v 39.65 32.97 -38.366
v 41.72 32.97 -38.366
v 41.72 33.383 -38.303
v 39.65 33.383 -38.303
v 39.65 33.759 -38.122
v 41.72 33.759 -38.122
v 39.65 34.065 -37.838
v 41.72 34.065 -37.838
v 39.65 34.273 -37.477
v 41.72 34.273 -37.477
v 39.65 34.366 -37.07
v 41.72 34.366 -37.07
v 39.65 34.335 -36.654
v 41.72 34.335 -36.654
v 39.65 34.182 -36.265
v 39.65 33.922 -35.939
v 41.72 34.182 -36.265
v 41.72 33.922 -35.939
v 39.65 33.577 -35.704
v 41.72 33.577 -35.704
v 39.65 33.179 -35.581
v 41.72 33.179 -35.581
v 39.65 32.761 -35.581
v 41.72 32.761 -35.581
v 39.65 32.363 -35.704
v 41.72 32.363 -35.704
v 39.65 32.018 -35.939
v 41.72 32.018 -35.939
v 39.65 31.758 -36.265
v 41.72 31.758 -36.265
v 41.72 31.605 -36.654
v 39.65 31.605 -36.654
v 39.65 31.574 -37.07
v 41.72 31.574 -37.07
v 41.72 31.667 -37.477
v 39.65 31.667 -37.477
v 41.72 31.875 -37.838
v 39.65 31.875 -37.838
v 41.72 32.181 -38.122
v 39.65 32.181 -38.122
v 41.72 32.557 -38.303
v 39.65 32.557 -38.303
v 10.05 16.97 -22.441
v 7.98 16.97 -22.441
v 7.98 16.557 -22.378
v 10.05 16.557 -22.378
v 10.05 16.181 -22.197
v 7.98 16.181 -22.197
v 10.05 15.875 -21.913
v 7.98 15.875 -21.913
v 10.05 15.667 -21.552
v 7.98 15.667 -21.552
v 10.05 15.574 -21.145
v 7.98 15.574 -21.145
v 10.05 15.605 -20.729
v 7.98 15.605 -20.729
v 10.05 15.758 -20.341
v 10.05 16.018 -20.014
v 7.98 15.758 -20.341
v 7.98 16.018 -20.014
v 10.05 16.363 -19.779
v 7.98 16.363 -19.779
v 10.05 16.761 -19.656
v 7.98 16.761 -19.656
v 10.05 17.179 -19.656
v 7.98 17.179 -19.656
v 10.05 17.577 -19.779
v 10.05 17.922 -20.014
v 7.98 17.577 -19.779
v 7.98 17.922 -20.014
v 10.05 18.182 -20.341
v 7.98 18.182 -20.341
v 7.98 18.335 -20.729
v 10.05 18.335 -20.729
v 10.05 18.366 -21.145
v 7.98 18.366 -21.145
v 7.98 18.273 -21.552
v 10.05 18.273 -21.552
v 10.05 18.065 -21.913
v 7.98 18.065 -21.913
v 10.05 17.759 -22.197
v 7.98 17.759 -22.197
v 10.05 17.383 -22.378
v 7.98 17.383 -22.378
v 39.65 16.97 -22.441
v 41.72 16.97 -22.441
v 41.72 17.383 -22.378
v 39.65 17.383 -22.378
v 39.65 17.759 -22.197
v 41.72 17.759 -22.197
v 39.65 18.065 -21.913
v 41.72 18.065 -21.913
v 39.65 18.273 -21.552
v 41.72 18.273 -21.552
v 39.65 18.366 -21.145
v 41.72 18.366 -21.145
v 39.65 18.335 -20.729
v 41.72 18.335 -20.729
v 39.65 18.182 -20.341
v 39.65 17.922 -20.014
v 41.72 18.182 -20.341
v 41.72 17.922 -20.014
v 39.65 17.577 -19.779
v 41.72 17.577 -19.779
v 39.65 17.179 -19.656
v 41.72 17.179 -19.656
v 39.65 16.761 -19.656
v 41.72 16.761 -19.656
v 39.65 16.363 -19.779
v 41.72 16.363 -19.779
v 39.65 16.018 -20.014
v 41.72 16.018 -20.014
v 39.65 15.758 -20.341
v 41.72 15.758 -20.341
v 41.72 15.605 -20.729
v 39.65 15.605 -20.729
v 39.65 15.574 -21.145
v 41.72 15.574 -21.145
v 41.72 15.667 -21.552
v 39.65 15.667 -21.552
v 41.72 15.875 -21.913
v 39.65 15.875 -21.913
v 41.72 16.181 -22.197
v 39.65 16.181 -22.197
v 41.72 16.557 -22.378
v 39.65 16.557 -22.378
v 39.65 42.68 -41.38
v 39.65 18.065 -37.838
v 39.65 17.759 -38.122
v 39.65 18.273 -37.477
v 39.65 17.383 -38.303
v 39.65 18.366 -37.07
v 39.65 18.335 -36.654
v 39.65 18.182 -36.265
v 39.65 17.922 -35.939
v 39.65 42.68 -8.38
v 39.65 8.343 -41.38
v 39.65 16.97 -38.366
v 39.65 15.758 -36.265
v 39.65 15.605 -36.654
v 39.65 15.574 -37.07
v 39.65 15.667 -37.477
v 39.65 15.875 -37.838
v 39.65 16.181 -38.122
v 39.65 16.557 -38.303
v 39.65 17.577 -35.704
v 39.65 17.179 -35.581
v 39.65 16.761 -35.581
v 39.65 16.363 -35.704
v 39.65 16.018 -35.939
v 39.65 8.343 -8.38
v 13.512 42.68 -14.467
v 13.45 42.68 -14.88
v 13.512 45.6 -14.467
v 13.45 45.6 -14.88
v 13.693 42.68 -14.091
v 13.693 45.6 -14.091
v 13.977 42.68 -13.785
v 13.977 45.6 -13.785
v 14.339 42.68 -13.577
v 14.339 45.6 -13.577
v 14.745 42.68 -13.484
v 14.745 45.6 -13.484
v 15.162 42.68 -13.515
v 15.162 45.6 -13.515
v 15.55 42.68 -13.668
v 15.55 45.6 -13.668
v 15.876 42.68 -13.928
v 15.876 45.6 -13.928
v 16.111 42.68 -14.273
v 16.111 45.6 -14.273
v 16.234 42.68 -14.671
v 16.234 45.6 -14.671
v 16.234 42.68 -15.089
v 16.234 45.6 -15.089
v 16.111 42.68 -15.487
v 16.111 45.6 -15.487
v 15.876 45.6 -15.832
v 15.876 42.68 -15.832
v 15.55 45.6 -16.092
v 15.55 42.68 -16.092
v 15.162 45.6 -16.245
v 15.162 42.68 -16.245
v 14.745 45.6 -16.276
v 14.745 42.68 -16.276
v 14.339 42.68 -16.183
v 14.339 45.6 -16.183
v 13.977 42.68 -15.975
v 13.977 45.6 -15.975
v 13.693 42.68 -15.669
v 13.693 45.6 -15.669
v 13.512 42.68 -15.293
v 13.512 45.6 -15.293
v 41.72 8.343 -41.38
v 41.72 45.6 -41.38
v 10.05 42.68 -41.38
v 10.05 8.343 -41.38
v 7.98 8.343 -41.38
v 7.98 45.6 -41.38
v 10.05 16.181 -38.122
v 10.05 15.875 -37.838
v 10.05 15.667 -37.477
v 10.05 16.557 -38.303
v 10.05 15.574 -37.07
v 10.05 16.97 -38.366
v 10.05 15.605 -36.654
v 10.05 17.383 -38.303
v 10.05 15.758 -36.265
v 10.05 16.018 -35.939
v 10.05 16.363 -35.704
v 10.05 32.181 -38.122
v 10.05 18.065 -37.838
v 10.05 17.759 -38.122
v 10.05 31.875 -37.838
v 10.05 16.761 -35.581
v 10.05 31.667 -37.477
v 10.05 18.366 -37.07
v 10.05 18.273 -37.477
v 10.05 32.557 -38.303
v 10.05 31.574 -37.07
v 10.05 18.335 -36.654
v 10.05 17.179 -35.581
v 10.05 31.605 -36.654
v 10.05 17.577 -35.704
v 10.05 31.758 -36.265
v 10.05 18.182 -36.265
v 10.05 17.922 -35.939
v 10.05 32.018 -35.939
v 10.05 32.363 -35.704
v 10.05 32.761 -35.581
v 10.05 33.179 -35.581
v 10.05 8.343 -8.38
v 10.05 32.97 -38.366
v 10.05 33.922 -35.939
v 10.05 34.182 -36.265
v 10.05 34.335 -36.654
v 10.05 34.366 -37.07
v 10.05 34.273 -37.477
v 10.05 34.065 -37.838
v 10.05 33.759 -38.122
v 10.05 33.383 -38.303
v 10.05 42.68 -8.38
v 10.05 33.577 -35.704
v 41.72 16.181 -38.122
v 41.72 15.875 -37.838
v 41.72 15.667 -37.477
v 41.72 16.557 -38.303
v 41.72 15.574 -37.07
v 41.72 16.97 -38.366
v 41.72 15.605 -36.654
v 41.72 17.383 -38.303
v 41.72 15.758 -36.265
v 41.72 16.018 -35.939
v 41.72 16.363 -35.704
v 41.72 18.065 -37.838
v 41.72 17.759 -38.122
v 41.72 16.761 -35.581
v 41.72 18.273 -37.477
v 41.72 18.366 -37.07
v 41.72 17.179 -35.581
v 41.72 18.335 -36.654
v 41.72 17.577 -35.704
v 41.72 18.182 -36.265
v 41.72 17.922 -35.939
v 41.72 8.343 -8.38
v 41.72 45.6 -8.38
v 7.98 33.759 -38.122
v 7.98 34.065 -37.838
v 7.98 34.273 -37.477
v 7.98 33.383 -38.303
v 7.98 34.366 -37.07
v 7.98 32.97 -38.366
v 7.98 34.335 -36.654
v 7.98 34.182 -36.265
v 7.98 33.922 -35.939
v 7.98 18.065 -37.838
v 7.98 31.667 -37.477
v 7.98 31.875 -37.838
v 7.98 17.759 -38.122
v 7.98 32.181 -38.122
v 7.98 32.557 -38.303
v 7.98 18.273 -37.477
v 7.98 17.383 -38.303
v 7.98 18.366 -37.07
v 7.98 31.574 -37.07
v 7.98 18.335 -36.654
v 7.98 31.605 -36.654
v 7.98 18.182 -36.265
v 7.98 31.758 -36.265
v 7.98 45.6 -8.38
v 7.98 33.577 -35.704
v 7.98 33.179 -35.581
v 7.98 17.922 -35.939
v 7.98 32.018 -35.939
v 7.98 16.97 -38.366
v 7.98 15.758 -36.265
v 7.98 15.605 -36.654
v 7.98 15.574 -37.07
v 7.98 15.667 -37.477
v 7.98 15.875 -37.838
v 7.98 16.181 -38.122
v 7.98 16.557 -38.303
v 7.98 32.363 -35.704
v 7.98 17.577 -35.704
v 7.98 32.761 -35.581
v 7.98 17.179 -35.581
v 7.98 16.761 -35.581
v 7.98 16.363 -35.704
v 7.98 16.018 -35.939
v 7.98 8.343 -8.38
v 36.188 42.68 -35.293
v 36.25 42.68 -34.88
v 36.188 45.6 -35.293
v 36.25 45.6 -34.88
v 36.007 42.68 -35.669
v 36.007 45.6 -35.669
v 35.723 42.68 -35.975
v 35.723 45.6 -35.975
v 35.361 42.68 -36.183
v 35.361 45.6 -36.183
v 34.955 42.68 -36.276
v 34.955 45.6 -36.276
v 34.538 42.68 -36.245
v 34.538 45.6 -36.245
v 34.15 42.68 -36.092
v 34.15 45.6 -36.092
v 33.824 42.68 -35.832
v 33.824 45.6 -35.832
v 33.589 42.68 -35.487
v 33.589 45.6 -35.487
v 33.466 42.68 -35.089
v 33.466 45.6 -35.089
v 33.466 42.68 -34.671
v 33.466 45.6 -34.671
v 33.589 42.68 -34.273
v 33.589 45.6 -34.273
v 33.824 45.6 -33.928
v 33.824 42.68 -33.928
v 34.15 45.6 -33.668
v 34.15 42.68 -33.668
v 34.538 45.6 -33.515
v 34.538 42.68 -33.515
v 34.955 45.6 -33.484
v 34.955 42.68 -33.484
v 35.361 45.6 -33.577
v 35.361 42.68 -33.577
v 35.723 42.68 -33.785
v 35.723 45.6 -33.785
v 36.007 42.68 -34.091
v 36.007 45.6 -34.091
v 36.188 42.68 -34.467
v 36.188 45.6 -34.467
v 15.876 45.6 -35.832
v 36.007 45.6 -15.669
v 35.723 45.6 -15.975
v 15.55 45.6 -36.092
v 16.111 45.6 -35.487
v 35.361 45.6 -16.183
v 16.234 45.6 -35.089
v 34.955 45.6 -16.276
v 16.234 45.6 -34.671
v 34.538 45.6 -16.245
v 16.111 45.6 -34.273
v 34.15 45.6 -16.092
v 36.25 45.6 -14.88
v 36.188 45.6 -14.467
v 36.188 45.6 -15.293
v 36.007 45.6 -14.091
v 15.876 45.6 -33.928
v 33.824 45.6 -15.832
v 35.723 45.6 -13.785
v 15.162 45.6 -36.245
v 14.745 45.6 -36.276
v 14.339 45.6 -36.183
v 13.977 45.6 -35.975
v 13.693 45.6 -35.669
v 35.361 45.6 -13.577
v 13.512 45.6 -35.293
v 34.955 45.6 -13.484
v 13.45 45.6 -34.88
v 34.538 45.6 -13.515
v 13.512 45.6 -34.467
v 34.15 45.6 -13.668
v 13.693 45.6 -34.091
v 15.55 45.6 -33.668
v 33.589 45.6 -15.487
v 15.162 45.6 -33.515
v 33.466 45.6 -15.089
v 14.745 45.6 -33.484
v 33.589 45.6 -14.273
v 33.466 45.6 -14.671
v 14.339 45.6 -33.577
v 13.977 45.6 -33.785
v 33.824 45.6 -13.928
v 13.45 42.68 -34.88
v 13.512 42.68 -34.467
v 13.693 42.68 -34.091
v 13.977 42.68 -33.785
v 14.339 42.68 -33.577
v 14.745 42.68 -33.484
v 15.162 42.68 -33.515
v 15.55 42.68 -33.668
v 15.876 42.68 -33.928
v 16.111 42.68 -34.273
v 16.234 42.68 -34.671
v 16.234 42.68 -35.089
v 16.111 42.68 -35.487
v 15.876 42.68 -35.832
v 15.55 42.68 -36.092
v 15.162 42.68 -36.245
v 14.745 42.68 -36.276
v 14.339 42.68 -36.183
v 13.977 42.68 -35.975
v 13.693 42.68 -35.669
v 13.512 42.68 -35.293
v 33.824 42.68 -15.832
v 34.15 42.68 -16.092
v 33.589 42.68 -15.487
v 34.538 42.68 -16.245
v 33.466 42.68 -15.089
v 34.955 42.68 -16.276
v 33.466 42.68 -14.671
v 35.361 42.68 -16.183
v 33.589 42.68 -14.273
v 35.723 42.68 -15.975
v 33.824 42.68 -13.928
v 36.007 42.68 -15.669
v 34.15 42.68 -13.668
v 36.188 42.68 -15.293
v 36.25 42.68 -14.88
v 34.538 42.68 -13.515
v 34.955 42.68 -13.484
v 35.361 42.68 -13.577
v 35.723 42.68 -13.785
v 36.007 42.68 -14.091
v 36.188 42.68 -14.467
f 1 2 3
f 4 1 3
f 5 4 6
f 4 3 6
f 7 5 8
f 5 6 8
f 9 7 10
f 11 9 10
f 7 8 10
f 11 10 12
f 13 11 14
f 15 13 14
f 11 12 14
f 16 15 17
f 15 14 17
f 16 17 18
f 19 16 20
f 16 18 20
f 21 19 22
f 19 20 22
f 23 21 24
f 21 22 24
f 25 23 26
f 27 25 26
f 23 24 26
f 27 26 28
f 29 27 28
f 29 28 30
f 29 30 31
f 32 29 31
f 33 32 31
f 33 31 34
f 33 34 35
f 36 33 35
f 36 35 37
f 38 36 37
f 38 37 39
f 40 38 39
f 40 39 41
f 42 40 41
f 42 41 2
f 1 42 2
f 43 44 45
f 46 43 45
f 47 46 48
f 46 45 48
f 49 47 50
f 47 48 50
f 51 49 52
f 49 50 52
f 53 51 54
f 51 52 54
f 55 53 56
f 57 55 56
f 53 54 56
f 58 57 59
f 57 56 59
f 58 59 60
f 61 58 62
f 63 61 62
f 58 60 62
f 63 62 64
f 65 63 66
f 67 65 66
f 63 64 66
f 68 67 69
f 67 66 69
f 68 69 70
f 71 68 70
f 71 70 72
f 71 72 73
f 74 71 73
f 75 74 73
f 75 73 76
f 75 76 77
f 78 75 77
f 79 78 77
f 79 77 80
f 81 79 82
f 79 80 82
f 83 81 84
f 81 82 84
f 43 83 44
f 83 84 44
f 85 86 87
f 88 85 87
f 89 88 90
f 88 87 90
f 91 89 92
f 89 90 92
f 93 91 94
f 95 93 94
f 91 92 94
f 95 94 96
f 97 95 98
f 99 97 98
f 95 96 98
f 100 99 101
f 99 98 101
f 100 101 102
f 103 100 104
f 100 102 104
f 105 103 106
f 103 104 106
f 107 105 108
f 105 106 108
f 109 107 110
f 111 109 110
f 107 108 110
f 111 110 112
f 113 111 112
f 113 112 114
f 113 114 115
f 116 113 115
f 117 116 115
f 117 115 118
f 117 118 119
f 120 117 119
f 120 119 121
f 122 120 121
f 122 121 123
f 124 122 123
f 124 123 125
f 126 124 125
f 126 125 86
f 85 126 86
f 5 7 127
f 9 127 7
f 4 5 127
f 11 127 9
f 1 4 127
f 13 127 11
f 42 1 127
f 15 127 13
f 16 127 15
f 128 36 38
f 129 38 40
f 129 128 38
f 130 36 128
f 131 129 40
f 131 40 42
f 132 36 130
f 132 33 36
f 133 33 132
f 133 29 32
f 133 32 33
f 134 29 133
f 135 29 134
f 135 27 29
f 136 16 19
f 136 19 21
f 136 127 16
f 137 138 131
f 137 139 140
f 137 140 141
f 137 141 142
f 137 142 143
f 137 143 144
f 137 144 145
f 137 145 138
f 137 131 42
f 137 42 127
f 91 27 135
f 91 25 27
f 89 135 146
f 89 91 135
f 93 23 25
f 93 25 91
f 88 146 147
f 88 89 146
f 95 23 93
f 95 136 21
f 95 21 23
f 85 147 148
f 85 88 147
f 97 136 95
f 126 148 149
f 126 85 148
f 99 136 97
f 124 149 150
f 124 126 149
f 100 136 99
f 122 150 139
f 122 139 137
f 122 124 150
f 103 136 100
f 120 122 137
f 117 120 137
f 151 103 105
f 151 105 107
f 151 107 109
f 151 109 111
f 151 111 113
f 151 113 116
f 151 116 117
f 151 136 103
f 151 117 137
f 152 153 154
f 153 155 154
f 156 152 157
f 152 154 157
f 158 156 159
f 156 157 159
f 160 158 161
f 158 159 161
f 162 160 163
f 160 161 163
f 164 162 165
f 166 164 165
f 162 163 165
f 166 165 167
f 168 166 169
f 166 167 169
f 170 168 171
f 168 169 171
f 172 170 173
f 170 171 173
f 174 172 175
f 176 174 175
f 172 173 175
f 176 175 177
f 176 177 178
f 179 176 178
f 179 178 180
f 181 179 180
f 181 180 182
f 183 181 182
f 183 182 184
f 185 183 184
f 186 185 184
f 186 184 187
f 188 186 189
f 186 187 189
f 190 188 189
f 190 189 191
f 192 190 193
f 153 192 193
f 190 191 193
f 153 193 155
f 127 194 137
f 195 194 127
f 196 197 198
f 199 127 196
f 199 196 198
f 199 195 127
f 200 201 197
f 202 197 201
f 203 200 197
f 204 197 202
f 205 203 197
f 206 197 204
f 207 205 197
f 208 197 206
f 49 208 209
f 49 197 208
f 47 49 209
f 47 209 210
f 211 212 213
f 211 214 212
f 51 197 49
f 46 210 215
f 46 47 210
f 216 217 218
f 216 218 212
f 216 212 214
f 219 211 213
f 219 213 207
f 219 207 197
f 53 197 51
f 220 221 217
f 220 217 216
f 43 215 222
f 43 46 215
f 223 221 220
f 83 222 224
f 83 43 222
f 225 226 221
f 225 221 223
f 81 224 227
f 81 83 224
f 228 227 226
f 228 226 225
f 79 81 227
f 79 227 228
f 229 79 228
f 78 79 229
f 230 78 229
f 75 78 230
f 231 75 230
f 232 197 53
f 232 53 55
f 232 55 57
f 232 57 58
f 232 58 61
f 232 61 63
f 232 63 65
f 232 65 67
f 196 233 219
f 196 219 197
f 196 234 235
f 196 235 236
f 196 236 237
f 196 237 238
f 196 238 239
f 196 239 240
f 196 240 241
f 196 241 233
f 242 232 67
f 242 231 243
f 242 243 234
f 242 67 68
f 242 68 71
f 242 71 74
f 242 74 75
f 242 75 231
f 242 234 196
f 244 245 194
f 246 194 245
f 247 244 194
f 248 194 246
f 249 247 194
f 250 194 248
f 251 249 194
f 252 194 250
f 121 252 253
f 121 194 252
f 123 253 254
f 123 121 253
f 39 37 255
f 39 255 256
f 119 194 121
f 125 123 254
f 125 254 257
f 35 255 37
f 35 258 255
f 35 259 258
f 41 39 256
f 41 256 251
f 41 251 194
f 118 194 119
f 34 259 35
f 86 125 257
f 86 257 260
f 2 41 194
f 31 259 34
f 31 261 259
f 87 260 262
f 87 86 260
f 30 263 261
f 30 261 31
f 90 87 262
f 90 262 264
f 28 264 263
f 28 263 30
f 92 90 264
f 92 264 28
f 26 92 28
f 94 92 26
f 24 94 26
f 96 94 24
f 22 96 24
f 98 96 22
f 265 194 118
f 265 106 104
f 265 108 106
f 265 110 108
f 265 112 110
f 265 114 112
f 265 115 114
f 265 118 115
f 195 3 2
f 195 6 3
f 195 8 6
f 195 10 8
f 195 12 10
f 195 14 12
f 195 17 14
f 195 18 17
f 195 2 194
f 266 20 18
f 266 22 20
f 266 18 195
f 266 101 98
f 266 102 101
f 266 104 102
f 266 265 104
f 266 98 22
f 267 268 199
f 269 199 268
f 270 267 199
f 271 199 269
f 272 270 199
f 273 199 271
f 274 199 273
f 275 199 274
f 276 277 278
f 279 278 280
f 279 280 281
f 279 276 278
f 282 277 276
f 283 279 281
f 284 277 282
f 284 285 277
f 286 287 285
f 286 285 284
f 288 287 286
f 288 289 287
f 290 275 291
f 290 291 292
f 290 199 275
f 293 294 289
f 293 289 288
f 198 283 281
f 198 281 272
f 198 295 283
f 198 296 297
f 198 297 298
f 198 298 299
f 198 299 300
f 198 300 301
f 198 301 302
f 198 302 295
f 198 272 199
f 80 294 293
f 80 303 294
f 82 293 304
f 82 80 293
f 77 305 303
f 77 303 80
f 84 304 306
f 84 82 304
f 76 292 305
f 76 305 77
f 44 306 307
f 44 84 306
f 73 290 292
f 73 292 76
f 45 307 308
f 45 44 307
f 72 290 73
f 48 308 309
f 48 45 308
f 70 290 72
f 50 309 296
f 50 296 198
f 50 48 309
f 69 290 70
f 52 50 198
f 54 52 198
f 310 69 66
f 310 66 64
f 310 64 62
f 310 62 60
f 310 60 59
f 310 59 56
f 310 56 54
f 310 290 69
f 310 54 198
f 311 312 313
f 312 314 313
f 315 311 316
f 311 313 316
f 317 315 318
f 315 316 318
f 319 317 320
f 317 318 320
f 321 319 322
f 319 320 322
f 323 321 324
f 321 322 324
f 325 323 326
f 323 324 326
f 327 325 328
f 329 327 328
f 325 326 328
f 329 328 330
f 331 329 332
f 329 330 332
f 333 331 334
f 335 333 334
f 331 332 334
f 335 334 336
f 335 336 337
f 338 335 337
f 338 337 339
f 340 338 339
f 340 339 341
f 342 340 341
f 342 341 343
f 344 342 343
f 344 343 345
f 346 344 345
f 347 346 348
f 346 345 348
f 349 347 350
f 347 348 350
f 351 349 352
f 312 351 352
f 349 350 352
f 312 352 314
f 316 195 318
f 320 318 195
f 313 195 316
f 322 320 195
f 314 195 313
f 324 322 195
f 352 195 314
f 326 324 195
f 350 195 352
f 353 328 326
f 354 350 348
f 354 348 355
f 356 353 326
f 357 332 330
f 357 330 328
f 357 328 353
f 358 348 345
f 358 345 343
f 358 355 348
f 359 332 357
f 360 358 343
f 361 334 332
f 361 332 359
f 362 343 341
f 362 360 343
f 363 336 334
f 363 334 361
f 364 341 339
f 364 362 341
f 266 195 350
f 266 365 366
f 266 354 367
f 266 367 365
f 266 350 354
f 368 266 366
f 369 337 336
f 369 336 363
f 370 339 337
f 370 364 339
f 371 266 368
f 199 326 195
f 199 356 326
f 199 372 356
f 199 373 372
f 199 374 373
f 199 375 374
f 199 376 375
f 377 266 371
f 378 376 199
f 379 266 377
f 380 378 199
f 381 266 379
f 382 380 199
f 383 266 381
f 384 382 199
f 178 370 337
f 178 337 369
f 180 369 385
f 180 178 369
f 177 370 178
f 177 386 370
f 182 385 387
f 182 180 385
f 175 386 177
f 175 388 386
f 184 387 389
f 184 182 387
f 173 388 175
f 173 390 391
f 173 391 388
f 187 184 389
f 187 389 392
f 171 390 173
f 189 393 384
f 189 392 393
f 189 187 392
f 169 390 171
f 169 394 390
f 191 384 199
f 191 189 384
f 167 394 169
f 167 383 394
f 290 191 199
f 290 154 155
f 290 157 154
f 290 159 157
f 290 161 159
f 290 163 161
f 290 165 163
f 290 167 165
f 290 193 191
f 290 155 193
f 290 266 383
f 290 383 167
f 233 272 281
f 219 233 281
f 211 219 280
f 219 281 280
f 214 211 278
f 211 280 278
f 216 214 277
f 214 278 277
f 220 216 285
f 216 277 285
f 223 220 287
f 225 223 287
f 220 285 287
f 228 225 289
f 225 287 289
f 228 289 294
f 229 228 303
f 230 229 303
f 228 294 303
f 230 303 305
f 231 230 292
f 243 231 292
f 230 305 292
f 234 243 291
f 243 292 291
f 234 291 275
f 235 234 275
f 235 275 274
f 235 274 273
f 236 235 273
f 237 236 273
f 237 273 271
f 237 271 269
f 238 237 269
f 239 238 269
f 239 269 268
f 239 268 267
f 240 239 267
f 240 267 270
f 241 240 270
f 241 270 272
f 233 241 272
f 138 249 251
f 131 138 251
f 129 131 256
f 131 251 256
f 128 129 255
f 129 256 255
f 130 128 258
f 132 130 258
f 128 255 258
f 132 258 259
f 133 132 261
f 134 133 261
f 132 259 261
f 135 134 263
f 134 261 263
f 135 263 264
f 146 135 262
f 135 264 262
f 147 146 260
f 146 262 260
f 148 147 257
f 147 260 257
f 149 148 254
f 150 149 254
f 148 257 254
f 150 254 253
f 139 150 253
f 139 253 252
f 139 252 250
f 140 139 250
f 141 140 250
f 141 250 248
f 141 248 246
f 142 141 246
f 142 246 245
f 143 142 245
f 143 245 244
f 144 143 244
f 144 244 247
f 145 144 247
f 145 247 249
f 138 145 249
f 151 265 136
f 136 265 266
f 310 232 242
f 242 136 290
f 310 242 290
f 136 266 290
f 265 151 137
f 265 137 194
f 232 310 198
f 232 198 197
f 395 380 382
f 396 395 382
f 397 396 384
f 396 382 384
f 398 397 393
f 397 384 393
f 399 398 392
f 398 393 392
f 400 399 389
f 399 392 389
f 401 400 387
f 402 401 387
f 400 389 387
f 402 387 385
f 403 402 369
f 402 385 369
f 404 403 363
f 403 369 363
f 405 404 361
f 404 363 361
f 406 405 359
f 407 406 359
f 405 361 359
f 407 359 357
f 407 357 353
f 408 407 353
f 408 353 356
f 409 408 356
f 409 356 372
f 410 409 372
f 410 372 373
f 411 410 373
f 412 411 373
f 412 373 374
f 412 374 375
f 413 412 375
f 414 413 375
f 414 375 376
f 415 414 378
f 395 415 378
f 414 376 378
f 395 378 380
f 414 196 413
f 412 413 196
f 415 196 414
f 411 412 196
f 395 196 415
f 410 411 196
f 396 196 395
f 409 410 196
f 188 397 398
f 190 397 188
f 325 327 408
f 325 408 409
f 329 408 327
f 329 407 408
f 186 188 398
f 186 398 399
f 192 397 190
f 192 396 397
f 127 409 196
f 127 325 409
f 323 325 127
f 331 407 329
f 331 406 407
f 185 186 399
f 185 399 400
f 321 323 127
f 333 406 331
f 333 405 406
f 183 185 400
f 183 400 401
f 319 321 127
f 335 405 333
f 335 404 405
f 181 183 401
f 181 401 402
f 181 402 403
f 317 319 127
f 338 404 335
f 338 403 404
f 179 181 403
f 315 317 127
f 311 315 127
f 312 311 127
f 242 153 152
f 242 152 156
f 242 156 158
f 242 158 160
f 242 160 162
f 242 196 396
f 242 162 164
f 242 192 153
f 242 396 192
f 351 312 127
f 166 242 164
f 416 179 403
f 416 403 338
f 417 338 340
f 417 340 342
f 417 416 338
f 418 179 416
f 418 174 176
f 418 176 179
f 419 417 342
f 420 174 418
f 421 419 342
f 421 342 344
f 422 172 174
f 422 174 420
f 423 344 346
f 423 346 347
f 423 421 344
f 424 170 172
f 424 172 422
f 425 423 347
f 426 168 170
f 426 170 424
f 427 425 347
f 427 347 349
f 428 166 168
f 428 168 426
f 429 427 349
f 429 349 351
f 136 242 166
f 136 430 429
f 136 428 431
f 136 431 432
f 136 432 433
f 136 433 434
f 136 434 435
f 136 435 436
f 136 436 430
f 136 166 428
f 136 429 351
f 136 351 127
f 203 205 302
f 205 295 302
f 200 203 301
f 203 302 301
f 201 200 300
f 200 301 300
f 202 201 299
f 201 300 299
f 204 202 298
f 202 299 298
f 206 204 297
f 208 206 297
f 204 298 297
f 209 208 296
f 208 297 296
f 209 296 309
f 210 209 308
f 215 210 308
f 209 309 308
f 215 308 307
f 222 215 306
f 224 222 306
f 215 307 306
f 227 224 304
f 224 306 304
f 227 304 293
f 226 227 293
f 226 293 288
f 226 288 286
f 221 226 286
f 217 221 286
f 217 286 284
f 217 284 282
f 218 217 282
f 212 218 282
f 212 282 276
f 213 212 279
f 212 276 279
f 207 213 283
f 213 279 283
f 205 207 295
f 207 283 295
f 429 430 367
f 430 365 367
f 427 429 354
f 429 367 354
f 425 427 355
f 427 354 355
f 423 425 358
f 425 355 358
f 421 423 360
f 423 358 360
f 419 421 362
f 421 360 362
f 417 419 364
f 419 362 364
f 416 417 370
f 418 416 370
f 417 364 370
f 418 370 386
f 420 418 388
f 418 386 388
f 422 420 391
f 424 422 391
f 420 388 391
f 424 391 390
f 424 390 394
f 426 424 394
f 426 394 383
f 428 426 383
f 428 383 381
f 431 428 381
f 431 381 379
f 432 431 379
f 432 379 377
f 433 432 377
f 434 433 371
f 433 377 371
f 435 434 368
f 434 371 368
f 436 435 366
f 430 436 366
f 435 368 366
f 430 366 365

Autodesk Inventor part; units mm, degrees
ref_plane "YZ Plane" through (0, 0, 0) normal (1, 0, 0) x (0, 1, 0)
ref_plane "XZ Plane" through (0, 0, 0) normal (0, 1, 0) x (-1, 0, 0)
ref_plane "Arbeitsebene1" through (49.7, 8, -8.38) normal (0, 0, -1) x (-1, 0, 0)
sketch "Skizze1" plane through (49.7, 8, -8.38) normal (0, 0, -1) x (-1, 0, 0)
  line L0 (2, 0) -> (2, 41.6) projected
  line L1 (7.88, 0) -> (2, 0) projected
  line L2 (7.88, 34.1) -> (7.88, 0) projected
  line L3 (47.7, 34.1) -> (7.88, 34.1) projected
  line L4 (47.7, 41.6) -> (47.7, 34.1) projected
  line L5 (2, 41.6) -> (47.7, 41.6) projected
  line L6 (40.85, 0) -> (40.85, -4.62) projected
  line L7 (40.85, -4.62) -> (8.85, -4.62) projected
  line L8 (8.85, -4.62) -> (8.85, 0) projected
  line L9 (2, 0) -> (8.85, 0) projected
  line L10 (2, -7.5) -> (2, 0) projected
  line L11 (47.7, -7.5) -> (2, -7.5) projected
  line L12 (47.7, 34.1) -> (47.7, -7.5) projected
  line L13 (41.82, 34.1) -> (47.7, 34.1) projected
  line L14 (41.82, 0) -> (41.82, 34.1) projected
  line L15 (40.85, 0) -> (41.82, 0) projected
  line L16 (10.35, -3.12) -> (10.35, 34.38) projected
  line L17 (39.35, 34.38) -> (39.35, -3.12) projected
  line L18 (39.35, 34.38) -> (39.35, -3.12) projected
  line L19 (39.35, 34.38) -> (10.35, 34.38) projected
  line L20 (10.35, -3.12) -> (10.35, 34.38) projected
  line L21 (39.35, -3.12) -> (10.35, -3.12) projected
  line L22 (10.35, -3.12) -> (39.35, -3.12) construction
  line L23 (39.35, -3.12) -> (39.35, 34.38) construction
  line L24 (39.35, 34.38) -> (10.35, 34.38) construction
  line L25 (10.35, 34.38) -> (10.35, -3.12) construction
  line L26 (10.05, 34.68) -> (39.65, 34.68) construction
  line L27 (39.65, 34.68) -> (39.65, -3.42) construction
  line L28 (39.65, -3.42) -> (10.05, -3.42) construction
  line L29 (10.05, -3.42) -> (10.05, 34.68) construction
  line L30 (10.05, 0.3432) -> (7.98, 0.3432)
  line L31 (7.98, 0.3432) -> (7.98, 37.6)
  line L32 (7.98, 37.6) -> (10.05, 37.6)
  line L33 (10.05, 37.6) -> (10.05, 0.3432)
  line L34 (10.05, 37.6) -> (24.85, 37.6)
  line L35 (24.85, 37.6) -> (24.85, 34.68)
  line L36 (24.85, 34.68) -> (10.05, 34.68)
  line L37 (10.05, 34.68) -> (10.05, 37.6)
  point P0 (49.7, -8)
  point P1 (24.85, 34.68)
  dimension "d1" = 0.3
  dimension "d2" = 0.1
  dimension "d3" = 4
ref_plane "Arbeitsebene2" through (41.82, 8, -41.82) normal (0, 0, 1) x (1, 0, 0)
extrude "Extrusion1" add sketch "Skizze1" along normal blind 33 contours L31 L32 L33 L3 | L3 L33 L30 L31 | L33 L34 L35 L36
sketch "Skizze2" plane through (41.72, 8.3432, -8.38) normal (1, 0, 0) x (0, 0, -1)
  circle A0 centre (12.6606, 8.6268) radius 1.4 projected
  circle A1 centre (28.5855, 24.6268) radius 1.4 projected
  circle A2 centre (28.5855, 8.6268) radius 1.4 projected
  point P0 (-8.38, -8.3432)
extrude "Extrusion2" cut sketch "Skizze2" against normal blind 33
sketch "Skizze3" plane through (24.85, 45.6, -8.38) normal (0, 1, 0) x (1, 0, 0)
  line L0 (0, 0) -> (16.87, 0) projected
  line L1 (16.87, 0) -> (16.87, 33) projected
  line L2 (0, 33) -> (16.87, 33) projected
  line L3 (0, 0) -> (0, 33) projected
  line L4 (-10, 6.5) -> (10, 6.5)
  line L5 (10, 6.5) -> (10, 26.5)
  line L6 (10, 26.5) -> (-10, 26.5)
  line L7 (-10, 26.5) -> (-10, 6.5)
  line L8 (-10, 6.5) -> (10, 26.5) construction
  line L9 (10, 6.5) -> (-10, 26.5) construction
  circle A0 centre (10, 26.5) radius 1.4
  circle A1 centre (10, 6.5) radius 1.4
  point P0 (-24.85, -8.38)
  point P1 (0, 16.5)
  dimension "d8" = 20
  dimension "d9" = 20
  dimension "d10" = 2.8
  dimension "d11" = 2.8
extrude "Extrusion3" cut sketch "Skizze3" against normal blind 33 contours A1 L5 L4 | L4 L5 A1 | A0 L5 L6 | L6 L5 A0
mirror "Spiegeln1" about plane through (24.85, 42.68, -8.38) normal (-1, 0, 0) of "Extrusion1", "Extrusion2", "Extrusion3"
properties part number "Assembly_Cube_Laser_Multicolour_insert_v3"
